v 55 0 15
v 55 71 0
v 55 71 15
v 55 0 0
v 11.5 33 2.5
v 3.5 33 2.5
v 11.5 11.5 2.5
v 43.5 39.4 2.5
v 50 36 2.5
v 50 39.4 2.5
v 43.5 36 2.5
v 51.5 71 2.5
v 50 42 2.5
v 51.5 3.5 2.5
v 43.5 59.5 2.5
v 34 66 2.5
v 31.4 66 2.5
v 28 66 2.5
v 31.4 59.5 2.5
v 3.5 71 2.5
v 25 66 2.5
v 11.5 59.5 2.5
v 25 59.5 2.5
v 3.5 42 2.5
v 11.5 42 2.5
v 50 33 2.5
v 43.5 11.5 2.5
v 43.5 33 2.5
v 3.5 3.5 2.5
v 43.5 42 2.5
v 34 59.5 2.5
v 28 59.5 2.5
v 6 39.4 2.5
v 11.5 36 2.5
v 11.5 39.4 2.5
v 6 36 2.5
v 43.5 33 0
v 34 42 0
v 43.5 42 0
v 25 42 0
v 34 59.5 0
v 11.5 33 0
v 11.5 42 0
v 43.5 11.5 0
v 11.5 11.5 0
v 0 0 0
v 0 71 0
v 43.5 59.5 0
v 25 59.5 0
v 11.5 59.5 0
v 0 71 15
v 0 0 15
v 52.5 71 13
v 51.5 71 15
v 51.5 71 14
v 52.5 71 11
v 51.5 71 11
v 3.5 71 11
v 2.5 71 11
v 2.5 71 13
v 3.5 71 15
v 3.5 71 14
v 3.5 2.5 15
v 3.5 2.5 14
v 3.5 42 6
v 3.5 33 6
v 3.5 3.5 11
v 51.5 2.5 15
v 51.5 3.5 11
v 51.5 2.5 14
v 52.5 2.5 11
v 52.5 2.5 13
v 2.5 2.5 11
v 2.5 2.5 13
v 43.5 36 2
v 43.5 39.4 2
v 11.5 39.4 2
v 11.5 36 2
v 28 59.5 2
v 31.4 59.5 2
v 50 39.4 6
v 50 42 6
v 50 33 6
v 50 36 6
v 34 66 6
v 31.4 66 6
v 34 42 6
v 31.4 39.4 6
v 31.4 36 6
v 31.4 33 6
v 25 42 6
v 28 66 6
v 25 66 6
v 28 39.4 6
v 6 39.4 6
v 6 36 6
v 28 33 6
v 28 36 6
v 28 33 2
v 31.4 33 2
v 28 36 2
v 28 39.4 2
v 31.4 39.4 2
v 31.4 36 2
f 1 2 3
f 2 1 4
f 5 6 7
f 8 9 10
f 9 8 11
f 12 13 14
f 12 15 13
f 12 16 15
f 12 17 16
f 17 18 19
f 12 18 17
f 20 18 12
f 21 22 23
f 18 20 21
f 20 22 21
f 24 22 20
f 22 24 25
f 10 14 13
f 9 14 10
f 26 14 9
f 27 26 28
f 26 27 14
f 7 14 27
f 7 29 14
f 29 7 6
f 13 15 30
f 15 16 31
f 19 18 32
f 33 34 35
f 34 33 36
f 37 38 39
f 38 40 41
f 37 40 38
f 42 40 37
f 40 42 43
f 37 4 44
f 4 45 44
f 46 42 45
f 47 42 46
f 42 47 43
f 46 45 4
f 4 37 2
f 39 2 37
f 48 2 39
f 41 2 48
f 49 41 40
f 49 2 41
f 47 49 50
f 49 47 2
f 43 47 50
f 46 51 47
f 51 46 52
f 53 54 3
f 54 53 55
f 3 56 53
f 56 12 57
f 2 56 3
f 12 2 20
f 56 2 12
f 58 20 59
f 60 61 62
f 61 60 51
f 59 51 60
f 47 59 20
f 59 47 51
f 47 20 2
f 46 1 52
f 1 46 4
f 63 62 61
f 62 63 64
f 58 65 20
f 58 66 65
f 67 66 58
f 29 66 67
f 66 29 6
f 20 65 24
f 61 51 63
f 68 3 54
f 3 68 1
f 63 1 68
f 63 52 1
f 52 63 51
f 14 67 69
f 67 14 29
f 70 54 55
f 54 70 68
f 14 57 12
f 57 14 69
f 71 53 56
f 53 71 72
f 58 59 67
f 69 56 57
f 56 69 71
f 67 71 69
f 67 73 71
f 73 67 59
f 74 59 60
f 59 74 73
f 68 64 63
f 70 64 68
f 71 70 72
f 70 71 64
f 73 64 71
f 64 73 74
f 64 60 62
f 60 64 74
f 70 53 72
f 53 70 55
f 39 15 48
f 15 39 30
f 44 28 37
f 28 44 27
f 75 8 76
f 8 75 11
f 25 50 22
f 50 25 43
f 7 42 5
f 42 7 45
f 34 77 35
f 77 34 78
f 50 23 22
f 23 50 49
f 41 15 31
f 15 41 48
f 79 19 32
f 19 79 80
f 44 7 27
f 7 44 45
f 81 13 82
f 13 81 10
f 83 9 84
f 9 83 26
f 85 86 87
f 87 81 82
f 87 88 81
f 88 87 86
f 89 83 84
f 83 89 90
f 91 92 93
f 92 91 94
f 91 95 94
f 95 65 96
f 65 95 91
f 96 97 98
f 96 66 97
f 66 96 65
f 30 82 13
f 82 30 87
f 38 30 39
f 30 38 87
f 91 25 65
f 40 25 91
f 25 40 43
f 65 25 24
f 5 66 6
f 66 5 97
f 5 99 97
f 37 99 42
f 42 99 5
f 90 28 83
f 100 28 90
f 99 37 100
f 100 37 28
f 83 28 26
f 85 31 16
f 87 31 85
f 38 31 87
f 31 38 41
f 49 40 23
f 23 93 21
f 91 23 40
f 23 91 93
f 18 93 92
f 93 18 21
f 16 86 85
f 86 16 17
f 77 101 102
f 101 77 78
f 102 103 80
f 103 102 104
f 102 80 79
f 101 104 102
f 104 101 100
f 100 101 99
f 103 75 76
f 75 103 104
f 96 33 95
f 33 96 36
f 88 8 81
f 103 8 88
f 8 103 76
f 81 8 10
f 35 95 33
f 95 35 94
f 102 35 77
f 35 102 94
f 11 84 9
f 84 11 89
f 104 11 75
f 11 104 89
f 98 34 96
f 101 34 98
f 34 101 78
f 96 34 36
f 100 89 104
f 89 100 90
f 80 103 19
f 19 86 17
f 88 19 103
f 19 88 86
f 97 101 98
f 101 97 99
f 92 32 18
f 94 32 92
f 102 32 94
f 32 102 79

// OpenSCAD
/* pcb_box_slide_with_tabs.scad
 * By Nicholas C Lewis - Jan 1, 2011
 * http://www.thingiverse.com/thing:5396 
 *
 * derived from pcb_box_slide.scad 
 *     Parametric, open PCB-box (slide-in) by chlunde
 *     http://www.thingiverse.com/thing:4071
 *
 * CHANGES
 * - adjusted to fit Arduino Mega
 * - added mounting tabs
 * - turned off cutouts
 * - adjusted bottom cutout size
 */

pcb_width = 50;
pcb_length =66;
pcb_height =2;
slisse = 1;

pcb_bottom_margin = 8.5;
wall_width_thick = 3.5;
wall_width = wall_width_thick-slisse;
box_height = 15;


module tab() {
	difference(){
		union() {
			translate([-4,-4,0])
			cube([4,8,wall_width]);
			translate([-4,0,0])
				cylinder(r=4, h = wall_width);
		}
		translate([-4,0,0])
		cylinder(r= 2.5, h = wall_width+3,center=true);
	}

}

module box() {
  union() {
    cube([pcb_width + 2*wall_width, pcb_length + 2*wall_width, wall_width]);

    cube([wall_width_thick, pcb_length + 2*wall_width, box_height]);

    cube([pcb_width + 2*wall_width, wall_width_thick, box_height]);

    %translate([0, pcb_length+wall_width, 0])
      cube([pcb_width + 2*wall_width,wall_width,box_height]);

    translate([pcb_width + wall_width - slisse,0,0])
      cube([wall_width_thick, pcb_length + 2*wall_width, box_height]);
  }
//comment out this part to remove tabs
/*
 for(i=[5,(pcb_length + 2*wall_width)/2,pcb_length + 2*wall_width-5]){
	translate([0,i,0])tab();
	translate([pcb_width + 2*wall_width,i,0])mirror()tab();
 }
*/

}

module pcb() {
  translate([wall_width, wall_width, wall_width + pcb_bottom_margin])
    cube([pcb_width,pcb_length + wall_width + 0.1,pcb_height]);
  translate([wall_width, wall_width, wall_width + pcb_bottom_margin+pcb_height])rotate([0,45,0])
    cube([pcb_height,pcb_length + wall_width + 0.1,pcb_height]);
  translate([wall_width+pcb_width-2*cos(45)*pcb_height, wall_width, wall_width + pcb_bottom_margin+pcb_height])rotate([0,45,0])
    cube([pcb_height,pcb_length + wall_width + 0.1,pcb_height]);
  translate([wall_width_thick, wall_width, wall_width + pcb_bottom_margin])
    cube([pcb_width-2*slisse,pcb_length + wall_width + 0.1,box_height]);

}



module holes() {
  *translate([wall_width + pcb_width/2, wall_width_thick + 0.1, pcb_width/2+wall_width])
    rotate(a=90,v=[1,0,0])
      cylinder(r=pcb_width/2, h=wall_width_thick + 0.2);

  *translate([-0.1, wall_width + pcb_length/2, pcb_length/2 + wall_width])
    rotate(a=90,v=[0,1,0])
      cylinder(r=pcb_length/2, h=wall_width_thick + 0.2);

  *translate([pcb_width + wall_width - slisse - 0.1, wall_width + pcb_length/2, pcb_length/2 + wall_width])
    rotate(a=90,v=[0,1,0])
      cylinder(r=pcb_length/2, h=wall_width_thick + 0.2);

 * translate([pcb_width/2 + wall_width, wall_width + pcb_length/2, -0.1])
    rotate(a=0,v=[0,1,0])
      cylinder(r=min(pcb_length,pcb_width)/2 - wall_width/2, h=wall_width_thick + 0.2);
   
  inner_margin = 9;
  translate([inner_margin +wall_width, inner_margin+wall_width, -0.1])
    cube([pcb_width-inner_margin*2,pcb_length -inner_margin*2,wall_width + 0.2]);
}

difference() {
  box();
  pcb();
  holes();
}

 *color([1,0,0])
  translate([pcb_width/2 + wall_width, wall_width + pcb_length/2, -0.1])
    rotate(a=0,v=[0,1,0])
      cylinder(r=min(pcb_length,pcb_width)/2 - wall_width/2, h=wall_width_thick + 0.2);

difference() {
    union() {
        translate([0,pcb_length/2,0])
        cube([pcb_width,9,6]);
        translate([pcb_width/2,pcb_length/2,0])
        cube([9,pcb_length/2,6]);
    }

    translate([6,3+pcb_length/2,2])
    cube([pcb_width-6,3.4,6]);
    translate([3+pcb_width/2,pcb_length/2,2])
    cube([3.4,pcb_length/2+7,6]);
}
